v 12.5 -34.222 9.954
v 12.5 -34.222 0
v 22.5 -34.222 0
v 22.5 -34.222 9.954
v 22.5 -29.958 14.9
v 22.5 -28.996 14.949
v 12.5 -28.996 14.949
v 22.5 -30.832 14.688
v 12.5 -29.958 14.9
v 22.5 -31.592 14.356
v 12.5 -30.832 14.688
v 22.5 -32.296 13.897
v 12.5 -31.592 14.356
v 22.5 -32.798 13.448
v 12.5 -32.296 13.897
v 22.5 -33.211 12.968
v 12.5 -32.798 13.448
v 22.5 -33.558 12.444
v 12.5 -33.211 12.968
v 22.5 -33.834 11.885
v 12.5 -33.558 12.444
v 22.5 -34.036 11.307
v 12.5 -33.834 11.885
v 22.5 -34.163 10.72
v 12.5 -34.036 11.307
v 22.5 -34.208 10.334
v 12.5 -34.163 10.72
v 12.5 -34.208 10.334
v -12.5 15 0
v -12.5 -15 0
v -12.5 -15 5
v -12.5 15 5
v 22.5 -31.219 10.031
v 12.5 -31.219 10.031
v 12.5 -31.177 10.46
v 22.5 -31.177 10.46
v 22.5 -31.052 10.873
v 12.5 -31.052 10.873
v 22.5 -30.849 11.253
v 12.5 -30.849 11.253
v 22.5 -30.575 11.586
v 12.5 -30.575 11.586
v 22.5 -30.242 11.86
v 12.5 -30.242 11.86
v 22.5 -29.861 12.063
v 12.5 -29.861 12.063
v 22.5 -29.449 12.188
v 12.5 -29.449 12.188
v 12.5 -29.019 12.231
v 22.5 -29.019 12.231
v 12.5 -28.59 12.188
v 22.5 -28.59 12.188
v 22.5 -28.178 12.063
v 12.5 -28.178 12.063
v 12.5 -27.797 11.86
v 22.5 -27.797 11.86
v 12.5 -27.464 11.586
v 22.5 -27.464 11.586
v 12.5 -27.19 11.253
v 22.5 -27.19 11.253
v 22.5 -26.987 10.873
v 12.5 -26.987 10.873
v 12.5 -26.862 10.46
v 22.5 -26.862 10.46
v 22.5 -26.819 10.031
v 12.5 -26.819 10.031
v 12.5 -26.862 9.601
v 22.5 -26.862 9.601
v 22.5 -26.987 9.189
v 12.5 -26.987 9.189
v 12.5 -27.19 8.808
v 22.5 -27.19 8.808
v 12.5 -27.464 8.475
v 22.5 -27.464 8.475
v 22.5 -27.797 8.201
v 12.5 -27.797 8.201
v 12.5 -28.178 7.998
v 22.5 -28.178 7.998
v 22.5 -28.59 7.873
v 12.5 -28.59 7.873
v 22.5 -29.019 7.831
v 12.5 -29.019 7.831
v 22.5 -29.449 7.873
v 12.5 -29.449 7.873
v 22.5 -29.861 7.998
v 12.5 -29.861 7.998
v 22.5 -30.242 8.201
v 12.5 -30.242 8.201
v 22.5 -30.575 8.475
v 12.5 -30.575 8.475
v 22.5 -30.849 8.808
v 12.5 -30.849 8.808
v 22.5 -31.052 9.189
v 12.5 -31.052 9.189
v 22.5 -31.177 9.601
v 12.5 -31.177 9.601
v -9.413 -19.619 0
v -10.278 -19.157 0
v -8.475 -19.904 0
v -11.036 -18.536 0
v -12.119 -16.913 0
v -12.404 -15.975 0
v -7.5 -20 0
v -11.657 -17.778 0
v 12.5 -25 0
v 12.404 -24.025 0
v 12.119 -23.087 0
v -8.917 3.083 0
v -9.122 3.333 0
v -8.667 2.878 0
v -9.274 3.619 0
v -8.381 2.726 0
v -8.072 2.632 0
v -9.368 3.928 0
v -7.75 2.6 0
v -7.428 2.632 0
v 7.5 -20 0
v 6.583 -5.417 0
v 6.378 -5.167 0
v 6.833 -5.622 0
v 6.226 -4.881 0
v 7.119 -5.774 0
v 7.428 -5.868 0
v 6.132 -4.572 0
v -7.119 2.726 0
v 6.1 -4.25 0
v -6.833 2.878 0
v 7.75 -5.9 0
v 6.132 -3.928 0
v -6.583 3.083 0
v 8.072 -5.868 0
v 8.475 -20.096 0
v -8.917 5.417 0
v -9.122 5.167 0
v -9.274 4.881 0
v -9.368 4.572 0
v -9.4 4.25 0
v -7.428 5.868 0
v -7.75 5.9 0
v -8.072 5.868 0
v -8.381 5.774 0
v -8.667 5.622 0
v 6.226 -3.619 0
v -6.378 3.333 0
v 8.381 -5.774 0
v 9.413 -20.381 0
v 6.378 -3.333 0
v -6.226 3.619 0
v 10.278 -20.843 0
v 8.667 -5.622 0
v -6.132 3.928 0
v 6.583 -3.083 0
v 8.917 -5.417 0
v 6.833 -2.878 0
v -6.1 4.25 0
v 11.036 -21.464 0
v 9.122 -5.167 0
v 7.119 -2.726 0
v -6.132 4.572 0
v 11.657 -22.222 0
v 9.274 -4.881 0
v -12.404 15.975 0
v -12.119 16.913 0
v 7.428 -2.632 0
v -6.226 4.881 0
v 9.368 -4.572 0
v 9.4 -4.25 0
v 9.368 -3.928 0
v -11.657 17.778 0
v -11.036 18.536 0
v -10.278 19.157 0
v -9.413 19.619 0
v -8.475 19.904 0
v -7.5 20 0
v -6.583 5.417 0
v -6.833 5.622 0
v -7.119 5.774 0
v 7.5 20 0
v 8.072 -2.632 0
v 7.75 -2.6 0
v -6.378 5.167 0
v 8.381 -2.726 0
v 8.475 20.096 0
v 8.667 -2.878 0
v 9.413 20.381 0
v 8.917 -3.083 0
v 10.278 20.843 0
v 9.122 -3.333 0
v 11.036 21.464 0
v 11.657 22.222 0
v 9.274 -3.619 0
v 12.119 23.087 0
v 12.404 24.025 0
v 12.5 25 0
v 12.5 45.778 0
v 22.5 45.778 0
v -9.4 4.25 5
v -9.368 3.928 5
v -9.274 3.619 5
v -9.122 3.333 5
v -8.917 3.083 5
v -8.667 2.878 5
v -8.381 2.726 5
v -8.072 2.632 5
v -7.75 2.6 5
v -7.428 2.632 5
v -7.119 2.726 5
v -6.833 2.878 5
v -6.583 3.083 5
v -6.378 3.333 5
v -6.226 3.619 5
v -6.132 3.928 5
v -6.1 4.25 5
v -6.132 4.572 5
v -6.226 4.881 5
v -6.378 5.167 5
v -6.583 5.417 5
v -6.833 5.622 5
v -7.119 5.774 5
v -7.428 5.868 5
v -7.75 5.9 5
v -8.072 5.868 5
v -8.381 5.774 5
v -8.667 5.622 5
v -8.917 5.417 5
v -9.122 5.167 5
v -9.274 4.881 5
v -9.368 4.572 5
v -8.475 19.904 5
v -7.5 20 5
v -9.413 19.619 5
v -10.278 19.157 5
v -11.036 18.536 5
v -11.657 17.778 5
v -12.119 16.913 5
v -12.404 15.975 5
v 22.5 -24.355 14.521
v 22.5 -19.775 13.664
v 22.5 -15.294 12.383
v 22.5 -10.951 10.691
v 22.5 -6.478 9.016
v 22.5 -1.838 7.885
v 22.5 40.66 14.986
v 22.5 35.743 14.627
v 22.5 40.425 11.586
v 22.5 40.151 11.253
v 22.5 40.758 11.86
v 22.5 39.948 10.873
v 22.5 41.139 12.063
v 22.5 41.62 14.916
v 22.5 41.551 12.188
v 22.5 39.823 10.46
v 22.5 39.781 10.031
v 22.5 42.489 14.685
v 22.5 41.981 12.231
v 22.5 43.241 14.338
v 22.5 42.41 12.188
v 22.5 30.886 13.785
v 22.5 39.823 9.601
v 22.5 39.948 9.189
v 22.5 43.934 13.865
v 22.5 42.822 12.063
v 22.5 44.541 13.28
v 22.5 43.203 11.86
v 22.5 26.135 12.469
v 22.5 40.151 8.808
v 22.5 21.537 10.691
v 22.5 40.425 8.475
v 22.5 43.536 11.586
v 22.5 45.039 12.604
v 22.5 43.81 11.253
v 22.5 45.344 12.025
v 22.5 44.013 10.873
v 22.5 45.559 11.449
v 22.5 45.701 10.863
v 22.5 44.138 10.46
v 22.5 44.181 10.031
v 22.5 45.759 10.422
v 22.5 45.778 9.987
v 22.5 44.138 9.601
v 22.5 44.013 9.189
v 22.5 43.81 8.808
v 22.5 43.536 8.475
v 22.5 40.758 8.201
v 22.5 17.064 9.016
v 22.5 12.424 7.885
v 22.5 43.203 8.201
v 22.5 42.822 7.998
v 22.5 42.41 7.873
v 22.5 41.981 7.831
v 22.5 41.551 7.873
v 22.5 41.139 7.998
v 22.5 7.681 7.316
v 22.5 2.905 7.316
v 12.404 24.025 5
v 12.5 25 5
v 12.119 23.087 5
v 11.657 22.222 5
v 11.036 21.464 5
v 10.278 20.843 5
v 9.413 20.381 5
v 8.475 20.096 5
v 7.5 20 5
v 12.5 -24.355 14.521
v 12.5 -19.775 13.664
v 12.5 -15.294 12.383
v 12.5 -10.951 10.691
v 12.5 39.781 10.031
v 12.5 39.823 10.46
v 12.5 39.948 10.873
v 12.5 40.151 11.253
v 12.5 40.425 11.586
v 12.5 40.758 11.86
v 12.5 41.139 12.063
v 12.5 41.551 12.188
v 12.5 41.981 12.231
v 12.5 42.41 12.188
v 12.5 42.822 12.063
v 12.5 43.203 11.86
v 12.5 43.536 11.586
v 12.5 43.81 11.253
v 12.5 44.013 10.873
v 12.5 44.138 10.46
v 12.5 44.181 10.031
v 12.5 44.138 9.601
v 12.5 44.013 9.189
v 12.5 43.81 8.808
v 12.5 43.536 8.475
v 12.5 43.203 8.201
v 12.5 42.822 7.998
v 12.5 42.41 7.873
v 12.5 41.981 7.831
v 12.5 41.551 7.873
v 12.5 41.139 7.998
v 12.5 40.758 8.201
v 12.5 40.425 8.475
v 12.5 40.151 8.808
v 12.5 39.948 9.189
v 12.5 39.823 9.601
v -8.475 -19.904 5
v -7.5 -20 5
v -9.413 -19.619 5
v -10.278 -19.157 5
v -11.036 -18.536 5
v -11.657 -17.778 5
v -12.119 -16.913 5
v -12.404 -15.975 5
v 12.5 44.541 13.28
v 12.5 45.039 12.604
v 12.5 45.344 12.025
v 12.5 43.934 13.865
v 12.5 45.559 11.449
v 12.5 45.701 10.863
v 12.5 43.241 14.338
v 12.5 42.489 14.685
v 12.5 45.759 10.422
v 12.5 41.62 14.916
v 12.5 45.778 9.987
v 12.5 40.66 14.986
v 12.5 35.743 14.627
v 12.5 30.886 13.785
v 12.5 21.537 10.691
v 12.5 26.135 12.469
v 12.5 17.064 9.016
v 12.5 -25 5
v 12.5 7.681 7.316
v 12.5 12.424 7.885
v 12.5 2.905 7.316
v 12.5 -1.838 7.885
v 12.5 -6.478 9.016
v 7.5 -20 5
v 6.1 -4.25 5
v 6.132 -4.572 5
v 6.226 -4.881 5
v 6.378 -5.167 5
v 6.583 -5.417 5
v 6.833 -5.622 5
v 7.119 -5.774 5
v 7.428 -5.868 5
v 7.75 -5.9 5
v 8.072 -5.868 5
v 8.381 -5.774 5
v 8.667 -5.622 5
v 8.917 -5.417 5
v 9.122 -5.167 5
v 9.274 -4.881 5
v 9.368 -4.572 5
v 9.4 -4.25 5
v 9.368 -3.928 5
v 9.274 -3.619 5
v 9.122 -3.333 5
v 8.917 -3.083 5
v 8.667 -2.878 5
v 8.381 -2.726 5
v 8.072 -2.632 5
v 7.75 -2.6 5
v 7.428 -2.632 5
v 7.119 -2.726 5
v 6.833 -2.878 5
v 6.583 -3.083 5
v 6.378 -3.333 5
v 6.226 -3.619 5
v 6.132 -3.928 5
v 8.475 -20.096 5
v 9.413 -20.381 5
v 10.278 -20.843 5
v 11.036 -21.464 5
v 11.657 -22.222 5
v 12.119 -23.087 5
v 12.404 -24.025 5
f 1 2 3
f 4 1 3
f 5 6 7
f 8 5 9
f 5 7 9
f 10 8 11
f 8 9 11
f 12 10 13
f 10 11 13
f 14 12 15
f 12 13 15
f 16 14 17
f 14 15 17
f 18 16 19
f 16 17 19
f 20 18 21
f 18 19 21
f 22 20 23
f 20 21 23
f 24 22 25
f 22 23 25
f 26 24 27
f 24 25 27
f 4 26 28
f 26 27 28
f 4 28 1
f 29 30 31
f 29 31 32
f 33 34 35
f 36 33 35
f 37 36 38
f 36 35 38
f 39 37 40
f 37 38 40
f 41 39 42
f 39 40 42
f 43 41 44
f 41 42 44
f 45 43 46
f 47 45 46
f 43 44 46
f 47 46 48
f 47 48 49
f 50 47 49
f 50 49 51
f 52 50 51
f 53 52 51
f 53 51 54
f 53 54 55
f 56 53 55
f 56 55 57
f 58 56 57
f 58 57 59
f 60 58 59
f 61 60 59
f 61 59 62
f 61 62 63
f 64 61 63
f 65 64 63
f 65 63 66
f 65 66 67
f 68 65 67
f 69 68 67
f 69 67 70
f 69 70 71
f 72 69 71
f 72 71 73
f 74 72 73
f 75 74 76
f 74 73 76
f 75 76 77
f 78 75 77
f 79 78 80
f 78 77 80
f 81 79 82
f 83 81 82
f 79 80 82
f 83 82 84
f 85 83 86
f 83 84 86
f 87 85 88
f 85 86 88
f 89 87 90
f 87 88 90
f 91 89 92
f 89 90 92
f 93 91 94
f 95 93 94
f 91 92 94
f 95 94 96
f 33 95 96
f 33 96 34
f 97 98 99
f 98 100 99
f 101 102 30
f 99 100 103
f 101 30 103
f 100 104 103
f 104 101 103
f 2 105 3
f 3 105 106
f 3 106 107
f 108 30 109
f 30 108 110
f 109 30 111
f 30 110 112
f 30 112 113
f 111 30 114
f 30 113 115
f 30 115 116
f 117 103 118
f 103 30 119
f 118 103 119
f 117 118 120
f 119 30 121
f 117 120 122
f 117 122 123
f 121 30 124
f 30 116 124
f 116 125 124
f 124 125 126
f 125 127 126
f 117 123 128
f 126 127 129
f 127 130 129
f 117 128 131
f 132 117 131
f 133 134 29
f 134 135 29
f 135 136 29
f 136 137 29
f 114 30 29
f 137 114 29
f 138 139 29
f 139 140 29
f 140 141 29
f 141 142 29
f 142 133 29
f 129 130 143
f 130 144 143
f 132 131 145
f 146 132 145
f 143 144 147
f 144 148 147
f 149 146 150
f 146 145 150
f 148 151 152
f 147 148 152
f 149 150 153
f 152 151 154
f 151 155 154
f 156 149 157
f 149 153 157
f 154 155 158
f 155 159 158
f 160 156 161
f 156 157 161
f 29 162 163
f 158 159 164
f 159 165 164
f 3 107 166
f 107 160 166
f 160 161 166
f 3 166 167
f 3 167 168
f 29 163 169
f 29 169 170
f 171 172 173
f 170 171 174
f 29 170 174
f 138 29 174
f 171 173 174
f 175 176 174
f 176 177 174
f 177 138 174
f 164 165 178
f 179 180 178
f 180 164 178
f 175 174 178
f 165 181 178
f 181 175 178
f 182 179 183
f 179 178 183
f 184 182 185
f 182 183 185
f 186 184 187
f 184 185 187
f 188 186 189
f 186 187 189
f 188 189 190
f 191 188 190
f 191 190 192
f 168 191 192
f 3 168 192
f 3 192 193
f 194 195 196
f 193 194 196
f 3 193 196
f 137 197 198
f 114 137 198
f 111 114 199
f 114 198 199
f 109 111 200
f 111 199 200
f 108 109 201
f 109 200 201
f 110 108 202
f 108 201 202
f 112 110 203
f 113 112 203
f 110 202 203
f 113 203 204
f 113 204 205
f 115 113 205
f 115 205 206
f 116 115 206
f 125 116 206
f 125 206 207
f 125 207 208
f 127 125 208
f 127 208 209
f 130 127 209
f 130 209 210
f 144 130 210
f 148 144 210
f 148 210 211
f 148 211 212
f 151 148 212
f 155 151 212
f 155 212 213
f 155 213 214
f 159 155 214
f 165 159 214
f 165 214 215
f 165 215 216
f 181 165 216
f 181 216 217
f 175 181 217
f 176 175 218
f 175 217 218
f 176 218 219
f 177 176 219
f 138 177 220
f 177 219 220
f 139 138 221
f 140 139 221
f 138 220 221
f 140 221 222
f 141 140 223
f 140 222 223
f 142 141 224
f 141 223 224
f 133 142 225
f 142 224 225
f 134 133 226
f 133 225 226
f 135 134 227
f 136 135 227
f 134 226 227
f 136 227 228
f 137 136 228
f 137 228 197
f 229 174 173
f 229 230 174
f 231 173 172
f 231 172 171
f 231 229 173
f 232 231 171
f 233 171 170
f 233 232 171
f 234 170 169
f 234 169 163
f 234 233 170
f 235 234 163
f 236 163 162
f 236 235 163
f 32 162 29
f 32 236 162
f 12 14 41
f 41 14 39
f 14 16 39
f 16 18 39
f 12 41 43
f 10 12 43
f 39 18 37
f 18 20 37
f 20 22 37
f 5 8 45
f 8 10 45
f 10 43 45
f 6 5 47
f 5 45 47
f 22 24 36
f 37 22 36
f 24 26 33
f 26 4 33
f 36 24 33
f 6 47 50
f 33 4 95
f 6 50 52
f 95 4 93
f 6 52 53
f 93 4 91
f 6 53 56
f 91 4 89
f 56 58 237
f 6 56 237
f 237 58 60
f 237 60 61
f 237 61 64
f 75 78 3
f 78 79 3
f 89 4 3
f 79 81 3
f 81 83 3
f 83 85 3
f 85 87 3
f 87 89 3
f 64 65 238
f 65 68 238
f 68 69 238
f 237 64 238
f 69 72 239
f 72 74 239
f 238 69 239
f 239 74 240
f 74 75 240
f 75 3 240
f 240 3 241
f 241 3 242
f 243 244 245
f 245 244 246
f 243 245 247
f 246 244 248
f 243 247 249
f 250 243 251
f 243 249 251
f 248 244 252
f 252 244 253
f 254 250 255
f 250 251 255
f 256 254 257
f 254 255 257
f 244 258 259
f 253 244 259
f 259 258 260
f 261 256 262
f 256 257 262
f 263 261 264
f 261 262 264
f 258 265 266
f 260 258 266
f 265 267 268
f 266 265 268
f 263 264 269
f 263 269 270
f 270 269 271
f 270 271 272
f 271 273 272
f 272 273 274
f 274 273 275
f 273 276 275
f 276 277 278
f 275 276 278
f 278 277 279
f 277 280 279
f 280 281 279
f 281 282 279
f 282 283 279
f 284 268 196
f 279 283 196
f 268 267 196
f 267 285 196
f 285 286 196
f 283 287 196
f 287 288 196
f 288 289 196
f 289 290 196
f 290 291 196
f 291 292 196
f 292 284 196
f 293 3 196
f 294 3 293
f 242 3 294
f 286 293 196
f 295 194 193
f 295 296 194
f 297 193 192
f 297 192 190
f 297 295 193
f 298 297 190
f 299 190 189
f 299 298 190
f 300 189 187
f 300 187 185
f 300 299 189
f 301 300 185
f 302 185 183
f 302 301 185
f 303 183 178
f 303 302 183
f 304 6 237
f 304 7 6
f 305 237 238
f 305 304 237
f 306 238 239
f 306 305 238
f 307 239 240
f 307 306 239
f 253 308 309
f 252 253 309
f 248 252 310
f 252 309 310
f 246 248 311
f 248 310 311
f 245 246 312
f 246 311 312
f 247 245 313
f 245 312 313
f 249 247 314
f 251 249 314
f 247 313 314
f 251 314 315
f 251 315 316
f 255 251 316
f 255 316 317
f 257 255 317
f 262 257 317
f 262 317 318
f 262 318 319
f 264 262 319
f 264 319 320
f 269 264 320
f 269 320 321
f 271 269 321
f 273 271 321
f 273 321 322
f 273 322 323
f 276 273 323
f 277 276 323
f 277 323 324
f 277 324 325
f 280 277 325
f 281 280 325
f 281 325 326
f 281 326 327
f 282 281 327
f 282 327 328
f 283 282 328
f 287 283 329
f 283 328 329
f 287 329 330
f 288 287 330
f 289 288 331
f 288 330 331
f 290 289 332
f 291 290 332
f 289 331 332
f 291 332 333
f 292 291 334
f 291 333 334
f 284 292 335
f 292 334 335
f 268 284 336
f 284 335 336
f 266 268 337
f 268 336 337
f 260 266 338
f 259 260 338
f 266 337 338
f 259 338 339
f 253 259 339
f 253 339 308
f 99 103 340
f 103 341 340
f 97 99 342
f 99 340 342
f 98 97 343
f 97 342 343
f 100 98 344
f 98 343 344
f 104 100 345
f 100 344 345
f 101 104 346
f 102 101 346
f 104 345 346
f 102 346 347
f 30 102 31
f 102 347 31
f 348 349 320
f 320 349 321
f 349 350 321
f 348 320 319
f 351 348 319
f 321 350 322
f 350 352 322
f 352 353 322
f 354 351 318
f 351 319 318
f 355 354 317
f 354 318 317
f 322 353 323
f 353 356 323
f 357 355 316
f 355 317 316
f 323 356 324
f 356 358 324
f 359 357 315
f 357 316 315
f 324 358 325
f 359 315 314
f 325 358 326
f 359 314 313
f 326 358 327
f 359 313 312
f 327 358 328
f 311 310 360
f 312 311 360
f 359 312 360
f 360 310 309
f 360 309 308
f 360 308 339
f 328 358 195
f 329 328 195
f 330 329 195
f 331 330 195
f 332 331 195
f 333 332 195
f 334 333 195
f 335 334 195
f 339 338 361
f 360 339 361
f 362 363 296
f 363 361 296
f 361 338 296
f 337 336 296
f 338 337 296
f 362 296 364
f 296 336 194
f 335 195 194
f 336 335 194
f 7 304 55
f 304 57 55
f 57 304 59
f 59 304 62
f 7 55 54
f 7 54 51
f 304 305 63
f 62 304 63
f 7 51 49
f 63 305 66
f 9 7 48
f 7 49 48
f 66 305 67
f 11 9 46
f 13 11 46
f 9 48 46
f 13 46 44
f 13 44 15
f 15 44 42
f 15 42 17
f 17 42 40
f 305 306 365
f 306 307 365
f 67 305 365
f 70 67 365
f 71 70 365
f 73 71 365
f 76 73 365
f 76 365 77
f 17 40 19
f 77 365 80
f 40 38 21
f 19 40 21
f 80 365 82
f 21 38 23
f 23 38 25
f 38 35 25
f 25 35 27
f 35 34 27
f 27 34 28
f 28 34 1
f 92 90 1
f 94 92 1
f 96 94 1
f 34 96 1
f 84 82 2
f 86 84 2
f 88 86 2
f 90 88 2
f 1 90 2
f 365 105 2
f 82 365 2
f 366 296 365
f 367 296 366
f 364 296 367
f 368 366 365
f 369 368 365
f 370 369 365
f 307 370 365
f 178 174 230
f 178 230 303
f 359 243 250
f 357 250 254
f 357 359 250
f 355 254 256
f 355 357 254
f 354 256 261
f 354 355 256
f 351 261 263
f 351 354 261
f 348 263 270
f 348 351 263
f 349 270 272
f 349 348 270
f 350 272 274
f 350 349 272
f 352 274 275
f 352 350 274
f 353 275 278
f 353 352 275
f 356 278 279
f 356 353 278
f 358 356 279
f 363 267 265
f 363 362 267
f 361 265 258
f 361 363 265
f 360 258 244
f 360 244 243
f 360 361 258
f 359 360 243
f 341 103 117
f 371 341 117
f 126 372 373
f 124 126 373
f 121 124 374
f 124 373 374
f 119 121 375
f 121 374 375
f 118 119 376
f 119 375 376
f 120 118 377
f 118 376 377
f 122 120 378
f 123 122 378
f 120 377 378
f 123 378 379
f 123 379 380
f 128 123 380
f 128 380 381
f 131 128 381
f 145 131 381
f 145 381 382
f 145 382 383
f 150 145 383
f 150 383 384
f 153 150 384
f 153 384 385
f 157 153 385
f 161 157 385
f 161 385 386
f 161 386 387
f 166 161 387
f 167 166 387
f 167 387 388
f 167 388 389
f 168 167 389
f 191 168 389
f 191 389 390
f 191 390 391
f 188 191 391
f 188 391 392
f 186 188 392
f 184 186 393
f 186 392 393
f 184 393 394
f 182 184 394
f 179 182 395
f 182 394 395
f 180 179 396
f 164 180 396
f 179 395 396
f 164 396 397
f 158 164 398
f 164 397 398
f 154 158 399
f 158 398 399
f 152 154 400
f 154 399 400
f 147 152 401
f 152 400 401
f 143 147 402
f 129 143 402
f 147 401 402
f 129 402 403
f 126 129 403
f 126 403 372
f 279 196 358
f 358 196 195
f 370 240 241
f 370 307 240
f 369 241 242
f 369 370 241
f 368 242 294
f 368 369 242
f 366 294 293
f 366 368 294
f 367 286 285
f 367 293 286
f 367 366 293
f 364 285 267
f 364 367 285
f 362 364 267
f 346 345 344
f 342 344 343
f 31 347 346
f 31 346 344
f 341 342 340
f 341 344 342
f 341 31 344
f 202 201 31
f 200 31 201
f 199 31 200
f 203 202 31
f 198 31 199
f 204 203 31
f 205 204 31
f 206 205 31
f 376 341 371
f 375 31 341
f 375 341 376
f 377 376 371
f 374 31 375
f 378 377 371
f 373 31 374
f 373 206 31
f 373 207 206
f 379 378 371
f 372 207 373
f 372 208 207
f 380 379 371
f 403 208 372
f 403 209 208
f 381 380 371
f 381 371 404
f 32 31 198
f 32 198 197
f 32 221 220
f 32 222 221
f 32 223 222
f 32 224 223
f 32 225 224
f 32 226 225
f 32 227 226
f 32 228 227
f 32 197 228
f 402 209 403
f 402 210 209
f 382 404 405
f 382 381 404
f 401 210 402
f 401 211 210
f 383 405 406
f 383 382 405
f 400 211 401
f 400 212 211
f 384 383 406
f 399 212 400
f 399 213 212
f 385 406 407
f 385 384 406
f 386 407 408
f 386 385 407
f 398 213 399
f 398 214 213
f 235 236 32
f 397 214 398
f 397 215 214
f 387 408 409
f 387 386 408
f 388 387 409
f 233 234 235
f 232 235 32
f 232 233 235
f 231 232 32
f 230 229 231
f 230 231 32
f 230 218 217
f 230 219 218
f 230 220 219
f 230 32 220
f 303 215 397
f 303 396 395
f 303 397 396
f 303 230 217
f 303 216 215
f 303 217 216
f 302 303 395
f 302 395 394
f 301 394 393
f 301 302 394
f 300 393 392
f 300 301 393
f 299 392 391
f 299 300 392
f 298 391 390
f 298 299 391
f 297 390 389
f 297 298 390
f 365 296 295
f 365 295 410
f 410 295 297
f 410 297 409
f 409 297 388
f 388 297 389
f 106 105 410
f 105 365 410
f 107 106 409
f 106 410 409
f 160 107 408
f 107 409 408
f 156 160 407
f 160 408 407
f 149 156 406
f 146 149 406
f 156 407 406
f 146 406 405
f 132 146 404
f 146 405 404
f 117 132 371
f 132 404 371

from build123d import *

# Parameters (mm, degrees)
F0_W     = 25
F0_H     = 40
F1_DEPTH = 5
F2_D     = 3.3
F3_DEPTH = 15
F5_DEPTH = 100
F6_R     = 40
F7_DEPTH = 25
F8_R     = 5
F9_R     = 50
F11_D    = 4.4
F12_R    = 5


with BuildPart() as f1:
    # F0 (on Top) → F1 (new body)
    with BuildSketch(Plane.XY):
        Rectangle(F0_W, F0_H)
    extrude(amount=F1_DEPTH)

    # F2 (through all)
    with Locations(Plane(origin=(0, 0, 0), x_dir=(1, 0, 0), z_dir=(0, 0, -1))):
        with Locations((-7.75, -4.25), (7.75, 4.25)):
            Hole(F2_D / 2)

    # F0 (on Top) → F3 (join)
    with BuildSketch(Plane.XY):
        Polygon((12.5, 45.7778535783), (12.5, 20), (12.5, -20), (12.5, -34.2221464217), (22.5, -34.2221464217), (22.5, 45.7778535783), align=None)
    extrude(amount=F3_DEPTH)

    # F4 (on face) → F5 (cut)
    with BuildSketch(Plane.XZ.offset(34.2221464217)):
        Polygon((24.4068726897, 16.530605033), (15.8845428377, 16.530605033), (15.8845428377, 15), (22.5, 15), (22.5, 0), (15.8845428377, 0), (15.8845428377, -1.5078758588), (24.4068726897, -1.5078758588), align=None)
    extrude(amount=-F5_DEPTH, mode=Mode.SUBTRACT)

    # F6 (on Right) → F7 (cut)
    with BuildSketch(Plane.YZ):
        with Locations((5.292929709, 47.2443401814)):
            Circle(F6_R)
    extrude(amount=F7_DEPTH, mode=Mode.SUBTRACT)

    # F8
    f8_edges = [f1.edges().sort_by_distance(p)[0] for p in [
        (12.5, -20, 2.5),
        (12.5, 20, 2.5),
        (-12.5, 20, 2.5),
        (-12.5, -20, 2.5),
    ]]
    fillet(f8_edges, radius=F8_R)

    # F9
    f9_edges = [f1.edges().sort_by_distance(p)[0] for p in [
        (17.5, -18.377781, 15),
        (17.5, 28.96364, 15),
    ]]
    fillet(f9_edges, radius=F9_R)

    # F11 (through all)
    with Locations(Plane.YZ.offset(22.5)):
        with Locations((-29.0194526315, 10.0306486711), (41.9805473685, 10.0306486711)):
            Hole(F11_D / 2)

    # F12
    f12_edges = [f1.edges().sort_by_distance(p)[0] for p in [
        (17.5, -34.222146, 15),
        (17.5, 45.777854, 15),
    ]]
    fillet(f12_edges, radius=F12_R)


solid = f1.part
